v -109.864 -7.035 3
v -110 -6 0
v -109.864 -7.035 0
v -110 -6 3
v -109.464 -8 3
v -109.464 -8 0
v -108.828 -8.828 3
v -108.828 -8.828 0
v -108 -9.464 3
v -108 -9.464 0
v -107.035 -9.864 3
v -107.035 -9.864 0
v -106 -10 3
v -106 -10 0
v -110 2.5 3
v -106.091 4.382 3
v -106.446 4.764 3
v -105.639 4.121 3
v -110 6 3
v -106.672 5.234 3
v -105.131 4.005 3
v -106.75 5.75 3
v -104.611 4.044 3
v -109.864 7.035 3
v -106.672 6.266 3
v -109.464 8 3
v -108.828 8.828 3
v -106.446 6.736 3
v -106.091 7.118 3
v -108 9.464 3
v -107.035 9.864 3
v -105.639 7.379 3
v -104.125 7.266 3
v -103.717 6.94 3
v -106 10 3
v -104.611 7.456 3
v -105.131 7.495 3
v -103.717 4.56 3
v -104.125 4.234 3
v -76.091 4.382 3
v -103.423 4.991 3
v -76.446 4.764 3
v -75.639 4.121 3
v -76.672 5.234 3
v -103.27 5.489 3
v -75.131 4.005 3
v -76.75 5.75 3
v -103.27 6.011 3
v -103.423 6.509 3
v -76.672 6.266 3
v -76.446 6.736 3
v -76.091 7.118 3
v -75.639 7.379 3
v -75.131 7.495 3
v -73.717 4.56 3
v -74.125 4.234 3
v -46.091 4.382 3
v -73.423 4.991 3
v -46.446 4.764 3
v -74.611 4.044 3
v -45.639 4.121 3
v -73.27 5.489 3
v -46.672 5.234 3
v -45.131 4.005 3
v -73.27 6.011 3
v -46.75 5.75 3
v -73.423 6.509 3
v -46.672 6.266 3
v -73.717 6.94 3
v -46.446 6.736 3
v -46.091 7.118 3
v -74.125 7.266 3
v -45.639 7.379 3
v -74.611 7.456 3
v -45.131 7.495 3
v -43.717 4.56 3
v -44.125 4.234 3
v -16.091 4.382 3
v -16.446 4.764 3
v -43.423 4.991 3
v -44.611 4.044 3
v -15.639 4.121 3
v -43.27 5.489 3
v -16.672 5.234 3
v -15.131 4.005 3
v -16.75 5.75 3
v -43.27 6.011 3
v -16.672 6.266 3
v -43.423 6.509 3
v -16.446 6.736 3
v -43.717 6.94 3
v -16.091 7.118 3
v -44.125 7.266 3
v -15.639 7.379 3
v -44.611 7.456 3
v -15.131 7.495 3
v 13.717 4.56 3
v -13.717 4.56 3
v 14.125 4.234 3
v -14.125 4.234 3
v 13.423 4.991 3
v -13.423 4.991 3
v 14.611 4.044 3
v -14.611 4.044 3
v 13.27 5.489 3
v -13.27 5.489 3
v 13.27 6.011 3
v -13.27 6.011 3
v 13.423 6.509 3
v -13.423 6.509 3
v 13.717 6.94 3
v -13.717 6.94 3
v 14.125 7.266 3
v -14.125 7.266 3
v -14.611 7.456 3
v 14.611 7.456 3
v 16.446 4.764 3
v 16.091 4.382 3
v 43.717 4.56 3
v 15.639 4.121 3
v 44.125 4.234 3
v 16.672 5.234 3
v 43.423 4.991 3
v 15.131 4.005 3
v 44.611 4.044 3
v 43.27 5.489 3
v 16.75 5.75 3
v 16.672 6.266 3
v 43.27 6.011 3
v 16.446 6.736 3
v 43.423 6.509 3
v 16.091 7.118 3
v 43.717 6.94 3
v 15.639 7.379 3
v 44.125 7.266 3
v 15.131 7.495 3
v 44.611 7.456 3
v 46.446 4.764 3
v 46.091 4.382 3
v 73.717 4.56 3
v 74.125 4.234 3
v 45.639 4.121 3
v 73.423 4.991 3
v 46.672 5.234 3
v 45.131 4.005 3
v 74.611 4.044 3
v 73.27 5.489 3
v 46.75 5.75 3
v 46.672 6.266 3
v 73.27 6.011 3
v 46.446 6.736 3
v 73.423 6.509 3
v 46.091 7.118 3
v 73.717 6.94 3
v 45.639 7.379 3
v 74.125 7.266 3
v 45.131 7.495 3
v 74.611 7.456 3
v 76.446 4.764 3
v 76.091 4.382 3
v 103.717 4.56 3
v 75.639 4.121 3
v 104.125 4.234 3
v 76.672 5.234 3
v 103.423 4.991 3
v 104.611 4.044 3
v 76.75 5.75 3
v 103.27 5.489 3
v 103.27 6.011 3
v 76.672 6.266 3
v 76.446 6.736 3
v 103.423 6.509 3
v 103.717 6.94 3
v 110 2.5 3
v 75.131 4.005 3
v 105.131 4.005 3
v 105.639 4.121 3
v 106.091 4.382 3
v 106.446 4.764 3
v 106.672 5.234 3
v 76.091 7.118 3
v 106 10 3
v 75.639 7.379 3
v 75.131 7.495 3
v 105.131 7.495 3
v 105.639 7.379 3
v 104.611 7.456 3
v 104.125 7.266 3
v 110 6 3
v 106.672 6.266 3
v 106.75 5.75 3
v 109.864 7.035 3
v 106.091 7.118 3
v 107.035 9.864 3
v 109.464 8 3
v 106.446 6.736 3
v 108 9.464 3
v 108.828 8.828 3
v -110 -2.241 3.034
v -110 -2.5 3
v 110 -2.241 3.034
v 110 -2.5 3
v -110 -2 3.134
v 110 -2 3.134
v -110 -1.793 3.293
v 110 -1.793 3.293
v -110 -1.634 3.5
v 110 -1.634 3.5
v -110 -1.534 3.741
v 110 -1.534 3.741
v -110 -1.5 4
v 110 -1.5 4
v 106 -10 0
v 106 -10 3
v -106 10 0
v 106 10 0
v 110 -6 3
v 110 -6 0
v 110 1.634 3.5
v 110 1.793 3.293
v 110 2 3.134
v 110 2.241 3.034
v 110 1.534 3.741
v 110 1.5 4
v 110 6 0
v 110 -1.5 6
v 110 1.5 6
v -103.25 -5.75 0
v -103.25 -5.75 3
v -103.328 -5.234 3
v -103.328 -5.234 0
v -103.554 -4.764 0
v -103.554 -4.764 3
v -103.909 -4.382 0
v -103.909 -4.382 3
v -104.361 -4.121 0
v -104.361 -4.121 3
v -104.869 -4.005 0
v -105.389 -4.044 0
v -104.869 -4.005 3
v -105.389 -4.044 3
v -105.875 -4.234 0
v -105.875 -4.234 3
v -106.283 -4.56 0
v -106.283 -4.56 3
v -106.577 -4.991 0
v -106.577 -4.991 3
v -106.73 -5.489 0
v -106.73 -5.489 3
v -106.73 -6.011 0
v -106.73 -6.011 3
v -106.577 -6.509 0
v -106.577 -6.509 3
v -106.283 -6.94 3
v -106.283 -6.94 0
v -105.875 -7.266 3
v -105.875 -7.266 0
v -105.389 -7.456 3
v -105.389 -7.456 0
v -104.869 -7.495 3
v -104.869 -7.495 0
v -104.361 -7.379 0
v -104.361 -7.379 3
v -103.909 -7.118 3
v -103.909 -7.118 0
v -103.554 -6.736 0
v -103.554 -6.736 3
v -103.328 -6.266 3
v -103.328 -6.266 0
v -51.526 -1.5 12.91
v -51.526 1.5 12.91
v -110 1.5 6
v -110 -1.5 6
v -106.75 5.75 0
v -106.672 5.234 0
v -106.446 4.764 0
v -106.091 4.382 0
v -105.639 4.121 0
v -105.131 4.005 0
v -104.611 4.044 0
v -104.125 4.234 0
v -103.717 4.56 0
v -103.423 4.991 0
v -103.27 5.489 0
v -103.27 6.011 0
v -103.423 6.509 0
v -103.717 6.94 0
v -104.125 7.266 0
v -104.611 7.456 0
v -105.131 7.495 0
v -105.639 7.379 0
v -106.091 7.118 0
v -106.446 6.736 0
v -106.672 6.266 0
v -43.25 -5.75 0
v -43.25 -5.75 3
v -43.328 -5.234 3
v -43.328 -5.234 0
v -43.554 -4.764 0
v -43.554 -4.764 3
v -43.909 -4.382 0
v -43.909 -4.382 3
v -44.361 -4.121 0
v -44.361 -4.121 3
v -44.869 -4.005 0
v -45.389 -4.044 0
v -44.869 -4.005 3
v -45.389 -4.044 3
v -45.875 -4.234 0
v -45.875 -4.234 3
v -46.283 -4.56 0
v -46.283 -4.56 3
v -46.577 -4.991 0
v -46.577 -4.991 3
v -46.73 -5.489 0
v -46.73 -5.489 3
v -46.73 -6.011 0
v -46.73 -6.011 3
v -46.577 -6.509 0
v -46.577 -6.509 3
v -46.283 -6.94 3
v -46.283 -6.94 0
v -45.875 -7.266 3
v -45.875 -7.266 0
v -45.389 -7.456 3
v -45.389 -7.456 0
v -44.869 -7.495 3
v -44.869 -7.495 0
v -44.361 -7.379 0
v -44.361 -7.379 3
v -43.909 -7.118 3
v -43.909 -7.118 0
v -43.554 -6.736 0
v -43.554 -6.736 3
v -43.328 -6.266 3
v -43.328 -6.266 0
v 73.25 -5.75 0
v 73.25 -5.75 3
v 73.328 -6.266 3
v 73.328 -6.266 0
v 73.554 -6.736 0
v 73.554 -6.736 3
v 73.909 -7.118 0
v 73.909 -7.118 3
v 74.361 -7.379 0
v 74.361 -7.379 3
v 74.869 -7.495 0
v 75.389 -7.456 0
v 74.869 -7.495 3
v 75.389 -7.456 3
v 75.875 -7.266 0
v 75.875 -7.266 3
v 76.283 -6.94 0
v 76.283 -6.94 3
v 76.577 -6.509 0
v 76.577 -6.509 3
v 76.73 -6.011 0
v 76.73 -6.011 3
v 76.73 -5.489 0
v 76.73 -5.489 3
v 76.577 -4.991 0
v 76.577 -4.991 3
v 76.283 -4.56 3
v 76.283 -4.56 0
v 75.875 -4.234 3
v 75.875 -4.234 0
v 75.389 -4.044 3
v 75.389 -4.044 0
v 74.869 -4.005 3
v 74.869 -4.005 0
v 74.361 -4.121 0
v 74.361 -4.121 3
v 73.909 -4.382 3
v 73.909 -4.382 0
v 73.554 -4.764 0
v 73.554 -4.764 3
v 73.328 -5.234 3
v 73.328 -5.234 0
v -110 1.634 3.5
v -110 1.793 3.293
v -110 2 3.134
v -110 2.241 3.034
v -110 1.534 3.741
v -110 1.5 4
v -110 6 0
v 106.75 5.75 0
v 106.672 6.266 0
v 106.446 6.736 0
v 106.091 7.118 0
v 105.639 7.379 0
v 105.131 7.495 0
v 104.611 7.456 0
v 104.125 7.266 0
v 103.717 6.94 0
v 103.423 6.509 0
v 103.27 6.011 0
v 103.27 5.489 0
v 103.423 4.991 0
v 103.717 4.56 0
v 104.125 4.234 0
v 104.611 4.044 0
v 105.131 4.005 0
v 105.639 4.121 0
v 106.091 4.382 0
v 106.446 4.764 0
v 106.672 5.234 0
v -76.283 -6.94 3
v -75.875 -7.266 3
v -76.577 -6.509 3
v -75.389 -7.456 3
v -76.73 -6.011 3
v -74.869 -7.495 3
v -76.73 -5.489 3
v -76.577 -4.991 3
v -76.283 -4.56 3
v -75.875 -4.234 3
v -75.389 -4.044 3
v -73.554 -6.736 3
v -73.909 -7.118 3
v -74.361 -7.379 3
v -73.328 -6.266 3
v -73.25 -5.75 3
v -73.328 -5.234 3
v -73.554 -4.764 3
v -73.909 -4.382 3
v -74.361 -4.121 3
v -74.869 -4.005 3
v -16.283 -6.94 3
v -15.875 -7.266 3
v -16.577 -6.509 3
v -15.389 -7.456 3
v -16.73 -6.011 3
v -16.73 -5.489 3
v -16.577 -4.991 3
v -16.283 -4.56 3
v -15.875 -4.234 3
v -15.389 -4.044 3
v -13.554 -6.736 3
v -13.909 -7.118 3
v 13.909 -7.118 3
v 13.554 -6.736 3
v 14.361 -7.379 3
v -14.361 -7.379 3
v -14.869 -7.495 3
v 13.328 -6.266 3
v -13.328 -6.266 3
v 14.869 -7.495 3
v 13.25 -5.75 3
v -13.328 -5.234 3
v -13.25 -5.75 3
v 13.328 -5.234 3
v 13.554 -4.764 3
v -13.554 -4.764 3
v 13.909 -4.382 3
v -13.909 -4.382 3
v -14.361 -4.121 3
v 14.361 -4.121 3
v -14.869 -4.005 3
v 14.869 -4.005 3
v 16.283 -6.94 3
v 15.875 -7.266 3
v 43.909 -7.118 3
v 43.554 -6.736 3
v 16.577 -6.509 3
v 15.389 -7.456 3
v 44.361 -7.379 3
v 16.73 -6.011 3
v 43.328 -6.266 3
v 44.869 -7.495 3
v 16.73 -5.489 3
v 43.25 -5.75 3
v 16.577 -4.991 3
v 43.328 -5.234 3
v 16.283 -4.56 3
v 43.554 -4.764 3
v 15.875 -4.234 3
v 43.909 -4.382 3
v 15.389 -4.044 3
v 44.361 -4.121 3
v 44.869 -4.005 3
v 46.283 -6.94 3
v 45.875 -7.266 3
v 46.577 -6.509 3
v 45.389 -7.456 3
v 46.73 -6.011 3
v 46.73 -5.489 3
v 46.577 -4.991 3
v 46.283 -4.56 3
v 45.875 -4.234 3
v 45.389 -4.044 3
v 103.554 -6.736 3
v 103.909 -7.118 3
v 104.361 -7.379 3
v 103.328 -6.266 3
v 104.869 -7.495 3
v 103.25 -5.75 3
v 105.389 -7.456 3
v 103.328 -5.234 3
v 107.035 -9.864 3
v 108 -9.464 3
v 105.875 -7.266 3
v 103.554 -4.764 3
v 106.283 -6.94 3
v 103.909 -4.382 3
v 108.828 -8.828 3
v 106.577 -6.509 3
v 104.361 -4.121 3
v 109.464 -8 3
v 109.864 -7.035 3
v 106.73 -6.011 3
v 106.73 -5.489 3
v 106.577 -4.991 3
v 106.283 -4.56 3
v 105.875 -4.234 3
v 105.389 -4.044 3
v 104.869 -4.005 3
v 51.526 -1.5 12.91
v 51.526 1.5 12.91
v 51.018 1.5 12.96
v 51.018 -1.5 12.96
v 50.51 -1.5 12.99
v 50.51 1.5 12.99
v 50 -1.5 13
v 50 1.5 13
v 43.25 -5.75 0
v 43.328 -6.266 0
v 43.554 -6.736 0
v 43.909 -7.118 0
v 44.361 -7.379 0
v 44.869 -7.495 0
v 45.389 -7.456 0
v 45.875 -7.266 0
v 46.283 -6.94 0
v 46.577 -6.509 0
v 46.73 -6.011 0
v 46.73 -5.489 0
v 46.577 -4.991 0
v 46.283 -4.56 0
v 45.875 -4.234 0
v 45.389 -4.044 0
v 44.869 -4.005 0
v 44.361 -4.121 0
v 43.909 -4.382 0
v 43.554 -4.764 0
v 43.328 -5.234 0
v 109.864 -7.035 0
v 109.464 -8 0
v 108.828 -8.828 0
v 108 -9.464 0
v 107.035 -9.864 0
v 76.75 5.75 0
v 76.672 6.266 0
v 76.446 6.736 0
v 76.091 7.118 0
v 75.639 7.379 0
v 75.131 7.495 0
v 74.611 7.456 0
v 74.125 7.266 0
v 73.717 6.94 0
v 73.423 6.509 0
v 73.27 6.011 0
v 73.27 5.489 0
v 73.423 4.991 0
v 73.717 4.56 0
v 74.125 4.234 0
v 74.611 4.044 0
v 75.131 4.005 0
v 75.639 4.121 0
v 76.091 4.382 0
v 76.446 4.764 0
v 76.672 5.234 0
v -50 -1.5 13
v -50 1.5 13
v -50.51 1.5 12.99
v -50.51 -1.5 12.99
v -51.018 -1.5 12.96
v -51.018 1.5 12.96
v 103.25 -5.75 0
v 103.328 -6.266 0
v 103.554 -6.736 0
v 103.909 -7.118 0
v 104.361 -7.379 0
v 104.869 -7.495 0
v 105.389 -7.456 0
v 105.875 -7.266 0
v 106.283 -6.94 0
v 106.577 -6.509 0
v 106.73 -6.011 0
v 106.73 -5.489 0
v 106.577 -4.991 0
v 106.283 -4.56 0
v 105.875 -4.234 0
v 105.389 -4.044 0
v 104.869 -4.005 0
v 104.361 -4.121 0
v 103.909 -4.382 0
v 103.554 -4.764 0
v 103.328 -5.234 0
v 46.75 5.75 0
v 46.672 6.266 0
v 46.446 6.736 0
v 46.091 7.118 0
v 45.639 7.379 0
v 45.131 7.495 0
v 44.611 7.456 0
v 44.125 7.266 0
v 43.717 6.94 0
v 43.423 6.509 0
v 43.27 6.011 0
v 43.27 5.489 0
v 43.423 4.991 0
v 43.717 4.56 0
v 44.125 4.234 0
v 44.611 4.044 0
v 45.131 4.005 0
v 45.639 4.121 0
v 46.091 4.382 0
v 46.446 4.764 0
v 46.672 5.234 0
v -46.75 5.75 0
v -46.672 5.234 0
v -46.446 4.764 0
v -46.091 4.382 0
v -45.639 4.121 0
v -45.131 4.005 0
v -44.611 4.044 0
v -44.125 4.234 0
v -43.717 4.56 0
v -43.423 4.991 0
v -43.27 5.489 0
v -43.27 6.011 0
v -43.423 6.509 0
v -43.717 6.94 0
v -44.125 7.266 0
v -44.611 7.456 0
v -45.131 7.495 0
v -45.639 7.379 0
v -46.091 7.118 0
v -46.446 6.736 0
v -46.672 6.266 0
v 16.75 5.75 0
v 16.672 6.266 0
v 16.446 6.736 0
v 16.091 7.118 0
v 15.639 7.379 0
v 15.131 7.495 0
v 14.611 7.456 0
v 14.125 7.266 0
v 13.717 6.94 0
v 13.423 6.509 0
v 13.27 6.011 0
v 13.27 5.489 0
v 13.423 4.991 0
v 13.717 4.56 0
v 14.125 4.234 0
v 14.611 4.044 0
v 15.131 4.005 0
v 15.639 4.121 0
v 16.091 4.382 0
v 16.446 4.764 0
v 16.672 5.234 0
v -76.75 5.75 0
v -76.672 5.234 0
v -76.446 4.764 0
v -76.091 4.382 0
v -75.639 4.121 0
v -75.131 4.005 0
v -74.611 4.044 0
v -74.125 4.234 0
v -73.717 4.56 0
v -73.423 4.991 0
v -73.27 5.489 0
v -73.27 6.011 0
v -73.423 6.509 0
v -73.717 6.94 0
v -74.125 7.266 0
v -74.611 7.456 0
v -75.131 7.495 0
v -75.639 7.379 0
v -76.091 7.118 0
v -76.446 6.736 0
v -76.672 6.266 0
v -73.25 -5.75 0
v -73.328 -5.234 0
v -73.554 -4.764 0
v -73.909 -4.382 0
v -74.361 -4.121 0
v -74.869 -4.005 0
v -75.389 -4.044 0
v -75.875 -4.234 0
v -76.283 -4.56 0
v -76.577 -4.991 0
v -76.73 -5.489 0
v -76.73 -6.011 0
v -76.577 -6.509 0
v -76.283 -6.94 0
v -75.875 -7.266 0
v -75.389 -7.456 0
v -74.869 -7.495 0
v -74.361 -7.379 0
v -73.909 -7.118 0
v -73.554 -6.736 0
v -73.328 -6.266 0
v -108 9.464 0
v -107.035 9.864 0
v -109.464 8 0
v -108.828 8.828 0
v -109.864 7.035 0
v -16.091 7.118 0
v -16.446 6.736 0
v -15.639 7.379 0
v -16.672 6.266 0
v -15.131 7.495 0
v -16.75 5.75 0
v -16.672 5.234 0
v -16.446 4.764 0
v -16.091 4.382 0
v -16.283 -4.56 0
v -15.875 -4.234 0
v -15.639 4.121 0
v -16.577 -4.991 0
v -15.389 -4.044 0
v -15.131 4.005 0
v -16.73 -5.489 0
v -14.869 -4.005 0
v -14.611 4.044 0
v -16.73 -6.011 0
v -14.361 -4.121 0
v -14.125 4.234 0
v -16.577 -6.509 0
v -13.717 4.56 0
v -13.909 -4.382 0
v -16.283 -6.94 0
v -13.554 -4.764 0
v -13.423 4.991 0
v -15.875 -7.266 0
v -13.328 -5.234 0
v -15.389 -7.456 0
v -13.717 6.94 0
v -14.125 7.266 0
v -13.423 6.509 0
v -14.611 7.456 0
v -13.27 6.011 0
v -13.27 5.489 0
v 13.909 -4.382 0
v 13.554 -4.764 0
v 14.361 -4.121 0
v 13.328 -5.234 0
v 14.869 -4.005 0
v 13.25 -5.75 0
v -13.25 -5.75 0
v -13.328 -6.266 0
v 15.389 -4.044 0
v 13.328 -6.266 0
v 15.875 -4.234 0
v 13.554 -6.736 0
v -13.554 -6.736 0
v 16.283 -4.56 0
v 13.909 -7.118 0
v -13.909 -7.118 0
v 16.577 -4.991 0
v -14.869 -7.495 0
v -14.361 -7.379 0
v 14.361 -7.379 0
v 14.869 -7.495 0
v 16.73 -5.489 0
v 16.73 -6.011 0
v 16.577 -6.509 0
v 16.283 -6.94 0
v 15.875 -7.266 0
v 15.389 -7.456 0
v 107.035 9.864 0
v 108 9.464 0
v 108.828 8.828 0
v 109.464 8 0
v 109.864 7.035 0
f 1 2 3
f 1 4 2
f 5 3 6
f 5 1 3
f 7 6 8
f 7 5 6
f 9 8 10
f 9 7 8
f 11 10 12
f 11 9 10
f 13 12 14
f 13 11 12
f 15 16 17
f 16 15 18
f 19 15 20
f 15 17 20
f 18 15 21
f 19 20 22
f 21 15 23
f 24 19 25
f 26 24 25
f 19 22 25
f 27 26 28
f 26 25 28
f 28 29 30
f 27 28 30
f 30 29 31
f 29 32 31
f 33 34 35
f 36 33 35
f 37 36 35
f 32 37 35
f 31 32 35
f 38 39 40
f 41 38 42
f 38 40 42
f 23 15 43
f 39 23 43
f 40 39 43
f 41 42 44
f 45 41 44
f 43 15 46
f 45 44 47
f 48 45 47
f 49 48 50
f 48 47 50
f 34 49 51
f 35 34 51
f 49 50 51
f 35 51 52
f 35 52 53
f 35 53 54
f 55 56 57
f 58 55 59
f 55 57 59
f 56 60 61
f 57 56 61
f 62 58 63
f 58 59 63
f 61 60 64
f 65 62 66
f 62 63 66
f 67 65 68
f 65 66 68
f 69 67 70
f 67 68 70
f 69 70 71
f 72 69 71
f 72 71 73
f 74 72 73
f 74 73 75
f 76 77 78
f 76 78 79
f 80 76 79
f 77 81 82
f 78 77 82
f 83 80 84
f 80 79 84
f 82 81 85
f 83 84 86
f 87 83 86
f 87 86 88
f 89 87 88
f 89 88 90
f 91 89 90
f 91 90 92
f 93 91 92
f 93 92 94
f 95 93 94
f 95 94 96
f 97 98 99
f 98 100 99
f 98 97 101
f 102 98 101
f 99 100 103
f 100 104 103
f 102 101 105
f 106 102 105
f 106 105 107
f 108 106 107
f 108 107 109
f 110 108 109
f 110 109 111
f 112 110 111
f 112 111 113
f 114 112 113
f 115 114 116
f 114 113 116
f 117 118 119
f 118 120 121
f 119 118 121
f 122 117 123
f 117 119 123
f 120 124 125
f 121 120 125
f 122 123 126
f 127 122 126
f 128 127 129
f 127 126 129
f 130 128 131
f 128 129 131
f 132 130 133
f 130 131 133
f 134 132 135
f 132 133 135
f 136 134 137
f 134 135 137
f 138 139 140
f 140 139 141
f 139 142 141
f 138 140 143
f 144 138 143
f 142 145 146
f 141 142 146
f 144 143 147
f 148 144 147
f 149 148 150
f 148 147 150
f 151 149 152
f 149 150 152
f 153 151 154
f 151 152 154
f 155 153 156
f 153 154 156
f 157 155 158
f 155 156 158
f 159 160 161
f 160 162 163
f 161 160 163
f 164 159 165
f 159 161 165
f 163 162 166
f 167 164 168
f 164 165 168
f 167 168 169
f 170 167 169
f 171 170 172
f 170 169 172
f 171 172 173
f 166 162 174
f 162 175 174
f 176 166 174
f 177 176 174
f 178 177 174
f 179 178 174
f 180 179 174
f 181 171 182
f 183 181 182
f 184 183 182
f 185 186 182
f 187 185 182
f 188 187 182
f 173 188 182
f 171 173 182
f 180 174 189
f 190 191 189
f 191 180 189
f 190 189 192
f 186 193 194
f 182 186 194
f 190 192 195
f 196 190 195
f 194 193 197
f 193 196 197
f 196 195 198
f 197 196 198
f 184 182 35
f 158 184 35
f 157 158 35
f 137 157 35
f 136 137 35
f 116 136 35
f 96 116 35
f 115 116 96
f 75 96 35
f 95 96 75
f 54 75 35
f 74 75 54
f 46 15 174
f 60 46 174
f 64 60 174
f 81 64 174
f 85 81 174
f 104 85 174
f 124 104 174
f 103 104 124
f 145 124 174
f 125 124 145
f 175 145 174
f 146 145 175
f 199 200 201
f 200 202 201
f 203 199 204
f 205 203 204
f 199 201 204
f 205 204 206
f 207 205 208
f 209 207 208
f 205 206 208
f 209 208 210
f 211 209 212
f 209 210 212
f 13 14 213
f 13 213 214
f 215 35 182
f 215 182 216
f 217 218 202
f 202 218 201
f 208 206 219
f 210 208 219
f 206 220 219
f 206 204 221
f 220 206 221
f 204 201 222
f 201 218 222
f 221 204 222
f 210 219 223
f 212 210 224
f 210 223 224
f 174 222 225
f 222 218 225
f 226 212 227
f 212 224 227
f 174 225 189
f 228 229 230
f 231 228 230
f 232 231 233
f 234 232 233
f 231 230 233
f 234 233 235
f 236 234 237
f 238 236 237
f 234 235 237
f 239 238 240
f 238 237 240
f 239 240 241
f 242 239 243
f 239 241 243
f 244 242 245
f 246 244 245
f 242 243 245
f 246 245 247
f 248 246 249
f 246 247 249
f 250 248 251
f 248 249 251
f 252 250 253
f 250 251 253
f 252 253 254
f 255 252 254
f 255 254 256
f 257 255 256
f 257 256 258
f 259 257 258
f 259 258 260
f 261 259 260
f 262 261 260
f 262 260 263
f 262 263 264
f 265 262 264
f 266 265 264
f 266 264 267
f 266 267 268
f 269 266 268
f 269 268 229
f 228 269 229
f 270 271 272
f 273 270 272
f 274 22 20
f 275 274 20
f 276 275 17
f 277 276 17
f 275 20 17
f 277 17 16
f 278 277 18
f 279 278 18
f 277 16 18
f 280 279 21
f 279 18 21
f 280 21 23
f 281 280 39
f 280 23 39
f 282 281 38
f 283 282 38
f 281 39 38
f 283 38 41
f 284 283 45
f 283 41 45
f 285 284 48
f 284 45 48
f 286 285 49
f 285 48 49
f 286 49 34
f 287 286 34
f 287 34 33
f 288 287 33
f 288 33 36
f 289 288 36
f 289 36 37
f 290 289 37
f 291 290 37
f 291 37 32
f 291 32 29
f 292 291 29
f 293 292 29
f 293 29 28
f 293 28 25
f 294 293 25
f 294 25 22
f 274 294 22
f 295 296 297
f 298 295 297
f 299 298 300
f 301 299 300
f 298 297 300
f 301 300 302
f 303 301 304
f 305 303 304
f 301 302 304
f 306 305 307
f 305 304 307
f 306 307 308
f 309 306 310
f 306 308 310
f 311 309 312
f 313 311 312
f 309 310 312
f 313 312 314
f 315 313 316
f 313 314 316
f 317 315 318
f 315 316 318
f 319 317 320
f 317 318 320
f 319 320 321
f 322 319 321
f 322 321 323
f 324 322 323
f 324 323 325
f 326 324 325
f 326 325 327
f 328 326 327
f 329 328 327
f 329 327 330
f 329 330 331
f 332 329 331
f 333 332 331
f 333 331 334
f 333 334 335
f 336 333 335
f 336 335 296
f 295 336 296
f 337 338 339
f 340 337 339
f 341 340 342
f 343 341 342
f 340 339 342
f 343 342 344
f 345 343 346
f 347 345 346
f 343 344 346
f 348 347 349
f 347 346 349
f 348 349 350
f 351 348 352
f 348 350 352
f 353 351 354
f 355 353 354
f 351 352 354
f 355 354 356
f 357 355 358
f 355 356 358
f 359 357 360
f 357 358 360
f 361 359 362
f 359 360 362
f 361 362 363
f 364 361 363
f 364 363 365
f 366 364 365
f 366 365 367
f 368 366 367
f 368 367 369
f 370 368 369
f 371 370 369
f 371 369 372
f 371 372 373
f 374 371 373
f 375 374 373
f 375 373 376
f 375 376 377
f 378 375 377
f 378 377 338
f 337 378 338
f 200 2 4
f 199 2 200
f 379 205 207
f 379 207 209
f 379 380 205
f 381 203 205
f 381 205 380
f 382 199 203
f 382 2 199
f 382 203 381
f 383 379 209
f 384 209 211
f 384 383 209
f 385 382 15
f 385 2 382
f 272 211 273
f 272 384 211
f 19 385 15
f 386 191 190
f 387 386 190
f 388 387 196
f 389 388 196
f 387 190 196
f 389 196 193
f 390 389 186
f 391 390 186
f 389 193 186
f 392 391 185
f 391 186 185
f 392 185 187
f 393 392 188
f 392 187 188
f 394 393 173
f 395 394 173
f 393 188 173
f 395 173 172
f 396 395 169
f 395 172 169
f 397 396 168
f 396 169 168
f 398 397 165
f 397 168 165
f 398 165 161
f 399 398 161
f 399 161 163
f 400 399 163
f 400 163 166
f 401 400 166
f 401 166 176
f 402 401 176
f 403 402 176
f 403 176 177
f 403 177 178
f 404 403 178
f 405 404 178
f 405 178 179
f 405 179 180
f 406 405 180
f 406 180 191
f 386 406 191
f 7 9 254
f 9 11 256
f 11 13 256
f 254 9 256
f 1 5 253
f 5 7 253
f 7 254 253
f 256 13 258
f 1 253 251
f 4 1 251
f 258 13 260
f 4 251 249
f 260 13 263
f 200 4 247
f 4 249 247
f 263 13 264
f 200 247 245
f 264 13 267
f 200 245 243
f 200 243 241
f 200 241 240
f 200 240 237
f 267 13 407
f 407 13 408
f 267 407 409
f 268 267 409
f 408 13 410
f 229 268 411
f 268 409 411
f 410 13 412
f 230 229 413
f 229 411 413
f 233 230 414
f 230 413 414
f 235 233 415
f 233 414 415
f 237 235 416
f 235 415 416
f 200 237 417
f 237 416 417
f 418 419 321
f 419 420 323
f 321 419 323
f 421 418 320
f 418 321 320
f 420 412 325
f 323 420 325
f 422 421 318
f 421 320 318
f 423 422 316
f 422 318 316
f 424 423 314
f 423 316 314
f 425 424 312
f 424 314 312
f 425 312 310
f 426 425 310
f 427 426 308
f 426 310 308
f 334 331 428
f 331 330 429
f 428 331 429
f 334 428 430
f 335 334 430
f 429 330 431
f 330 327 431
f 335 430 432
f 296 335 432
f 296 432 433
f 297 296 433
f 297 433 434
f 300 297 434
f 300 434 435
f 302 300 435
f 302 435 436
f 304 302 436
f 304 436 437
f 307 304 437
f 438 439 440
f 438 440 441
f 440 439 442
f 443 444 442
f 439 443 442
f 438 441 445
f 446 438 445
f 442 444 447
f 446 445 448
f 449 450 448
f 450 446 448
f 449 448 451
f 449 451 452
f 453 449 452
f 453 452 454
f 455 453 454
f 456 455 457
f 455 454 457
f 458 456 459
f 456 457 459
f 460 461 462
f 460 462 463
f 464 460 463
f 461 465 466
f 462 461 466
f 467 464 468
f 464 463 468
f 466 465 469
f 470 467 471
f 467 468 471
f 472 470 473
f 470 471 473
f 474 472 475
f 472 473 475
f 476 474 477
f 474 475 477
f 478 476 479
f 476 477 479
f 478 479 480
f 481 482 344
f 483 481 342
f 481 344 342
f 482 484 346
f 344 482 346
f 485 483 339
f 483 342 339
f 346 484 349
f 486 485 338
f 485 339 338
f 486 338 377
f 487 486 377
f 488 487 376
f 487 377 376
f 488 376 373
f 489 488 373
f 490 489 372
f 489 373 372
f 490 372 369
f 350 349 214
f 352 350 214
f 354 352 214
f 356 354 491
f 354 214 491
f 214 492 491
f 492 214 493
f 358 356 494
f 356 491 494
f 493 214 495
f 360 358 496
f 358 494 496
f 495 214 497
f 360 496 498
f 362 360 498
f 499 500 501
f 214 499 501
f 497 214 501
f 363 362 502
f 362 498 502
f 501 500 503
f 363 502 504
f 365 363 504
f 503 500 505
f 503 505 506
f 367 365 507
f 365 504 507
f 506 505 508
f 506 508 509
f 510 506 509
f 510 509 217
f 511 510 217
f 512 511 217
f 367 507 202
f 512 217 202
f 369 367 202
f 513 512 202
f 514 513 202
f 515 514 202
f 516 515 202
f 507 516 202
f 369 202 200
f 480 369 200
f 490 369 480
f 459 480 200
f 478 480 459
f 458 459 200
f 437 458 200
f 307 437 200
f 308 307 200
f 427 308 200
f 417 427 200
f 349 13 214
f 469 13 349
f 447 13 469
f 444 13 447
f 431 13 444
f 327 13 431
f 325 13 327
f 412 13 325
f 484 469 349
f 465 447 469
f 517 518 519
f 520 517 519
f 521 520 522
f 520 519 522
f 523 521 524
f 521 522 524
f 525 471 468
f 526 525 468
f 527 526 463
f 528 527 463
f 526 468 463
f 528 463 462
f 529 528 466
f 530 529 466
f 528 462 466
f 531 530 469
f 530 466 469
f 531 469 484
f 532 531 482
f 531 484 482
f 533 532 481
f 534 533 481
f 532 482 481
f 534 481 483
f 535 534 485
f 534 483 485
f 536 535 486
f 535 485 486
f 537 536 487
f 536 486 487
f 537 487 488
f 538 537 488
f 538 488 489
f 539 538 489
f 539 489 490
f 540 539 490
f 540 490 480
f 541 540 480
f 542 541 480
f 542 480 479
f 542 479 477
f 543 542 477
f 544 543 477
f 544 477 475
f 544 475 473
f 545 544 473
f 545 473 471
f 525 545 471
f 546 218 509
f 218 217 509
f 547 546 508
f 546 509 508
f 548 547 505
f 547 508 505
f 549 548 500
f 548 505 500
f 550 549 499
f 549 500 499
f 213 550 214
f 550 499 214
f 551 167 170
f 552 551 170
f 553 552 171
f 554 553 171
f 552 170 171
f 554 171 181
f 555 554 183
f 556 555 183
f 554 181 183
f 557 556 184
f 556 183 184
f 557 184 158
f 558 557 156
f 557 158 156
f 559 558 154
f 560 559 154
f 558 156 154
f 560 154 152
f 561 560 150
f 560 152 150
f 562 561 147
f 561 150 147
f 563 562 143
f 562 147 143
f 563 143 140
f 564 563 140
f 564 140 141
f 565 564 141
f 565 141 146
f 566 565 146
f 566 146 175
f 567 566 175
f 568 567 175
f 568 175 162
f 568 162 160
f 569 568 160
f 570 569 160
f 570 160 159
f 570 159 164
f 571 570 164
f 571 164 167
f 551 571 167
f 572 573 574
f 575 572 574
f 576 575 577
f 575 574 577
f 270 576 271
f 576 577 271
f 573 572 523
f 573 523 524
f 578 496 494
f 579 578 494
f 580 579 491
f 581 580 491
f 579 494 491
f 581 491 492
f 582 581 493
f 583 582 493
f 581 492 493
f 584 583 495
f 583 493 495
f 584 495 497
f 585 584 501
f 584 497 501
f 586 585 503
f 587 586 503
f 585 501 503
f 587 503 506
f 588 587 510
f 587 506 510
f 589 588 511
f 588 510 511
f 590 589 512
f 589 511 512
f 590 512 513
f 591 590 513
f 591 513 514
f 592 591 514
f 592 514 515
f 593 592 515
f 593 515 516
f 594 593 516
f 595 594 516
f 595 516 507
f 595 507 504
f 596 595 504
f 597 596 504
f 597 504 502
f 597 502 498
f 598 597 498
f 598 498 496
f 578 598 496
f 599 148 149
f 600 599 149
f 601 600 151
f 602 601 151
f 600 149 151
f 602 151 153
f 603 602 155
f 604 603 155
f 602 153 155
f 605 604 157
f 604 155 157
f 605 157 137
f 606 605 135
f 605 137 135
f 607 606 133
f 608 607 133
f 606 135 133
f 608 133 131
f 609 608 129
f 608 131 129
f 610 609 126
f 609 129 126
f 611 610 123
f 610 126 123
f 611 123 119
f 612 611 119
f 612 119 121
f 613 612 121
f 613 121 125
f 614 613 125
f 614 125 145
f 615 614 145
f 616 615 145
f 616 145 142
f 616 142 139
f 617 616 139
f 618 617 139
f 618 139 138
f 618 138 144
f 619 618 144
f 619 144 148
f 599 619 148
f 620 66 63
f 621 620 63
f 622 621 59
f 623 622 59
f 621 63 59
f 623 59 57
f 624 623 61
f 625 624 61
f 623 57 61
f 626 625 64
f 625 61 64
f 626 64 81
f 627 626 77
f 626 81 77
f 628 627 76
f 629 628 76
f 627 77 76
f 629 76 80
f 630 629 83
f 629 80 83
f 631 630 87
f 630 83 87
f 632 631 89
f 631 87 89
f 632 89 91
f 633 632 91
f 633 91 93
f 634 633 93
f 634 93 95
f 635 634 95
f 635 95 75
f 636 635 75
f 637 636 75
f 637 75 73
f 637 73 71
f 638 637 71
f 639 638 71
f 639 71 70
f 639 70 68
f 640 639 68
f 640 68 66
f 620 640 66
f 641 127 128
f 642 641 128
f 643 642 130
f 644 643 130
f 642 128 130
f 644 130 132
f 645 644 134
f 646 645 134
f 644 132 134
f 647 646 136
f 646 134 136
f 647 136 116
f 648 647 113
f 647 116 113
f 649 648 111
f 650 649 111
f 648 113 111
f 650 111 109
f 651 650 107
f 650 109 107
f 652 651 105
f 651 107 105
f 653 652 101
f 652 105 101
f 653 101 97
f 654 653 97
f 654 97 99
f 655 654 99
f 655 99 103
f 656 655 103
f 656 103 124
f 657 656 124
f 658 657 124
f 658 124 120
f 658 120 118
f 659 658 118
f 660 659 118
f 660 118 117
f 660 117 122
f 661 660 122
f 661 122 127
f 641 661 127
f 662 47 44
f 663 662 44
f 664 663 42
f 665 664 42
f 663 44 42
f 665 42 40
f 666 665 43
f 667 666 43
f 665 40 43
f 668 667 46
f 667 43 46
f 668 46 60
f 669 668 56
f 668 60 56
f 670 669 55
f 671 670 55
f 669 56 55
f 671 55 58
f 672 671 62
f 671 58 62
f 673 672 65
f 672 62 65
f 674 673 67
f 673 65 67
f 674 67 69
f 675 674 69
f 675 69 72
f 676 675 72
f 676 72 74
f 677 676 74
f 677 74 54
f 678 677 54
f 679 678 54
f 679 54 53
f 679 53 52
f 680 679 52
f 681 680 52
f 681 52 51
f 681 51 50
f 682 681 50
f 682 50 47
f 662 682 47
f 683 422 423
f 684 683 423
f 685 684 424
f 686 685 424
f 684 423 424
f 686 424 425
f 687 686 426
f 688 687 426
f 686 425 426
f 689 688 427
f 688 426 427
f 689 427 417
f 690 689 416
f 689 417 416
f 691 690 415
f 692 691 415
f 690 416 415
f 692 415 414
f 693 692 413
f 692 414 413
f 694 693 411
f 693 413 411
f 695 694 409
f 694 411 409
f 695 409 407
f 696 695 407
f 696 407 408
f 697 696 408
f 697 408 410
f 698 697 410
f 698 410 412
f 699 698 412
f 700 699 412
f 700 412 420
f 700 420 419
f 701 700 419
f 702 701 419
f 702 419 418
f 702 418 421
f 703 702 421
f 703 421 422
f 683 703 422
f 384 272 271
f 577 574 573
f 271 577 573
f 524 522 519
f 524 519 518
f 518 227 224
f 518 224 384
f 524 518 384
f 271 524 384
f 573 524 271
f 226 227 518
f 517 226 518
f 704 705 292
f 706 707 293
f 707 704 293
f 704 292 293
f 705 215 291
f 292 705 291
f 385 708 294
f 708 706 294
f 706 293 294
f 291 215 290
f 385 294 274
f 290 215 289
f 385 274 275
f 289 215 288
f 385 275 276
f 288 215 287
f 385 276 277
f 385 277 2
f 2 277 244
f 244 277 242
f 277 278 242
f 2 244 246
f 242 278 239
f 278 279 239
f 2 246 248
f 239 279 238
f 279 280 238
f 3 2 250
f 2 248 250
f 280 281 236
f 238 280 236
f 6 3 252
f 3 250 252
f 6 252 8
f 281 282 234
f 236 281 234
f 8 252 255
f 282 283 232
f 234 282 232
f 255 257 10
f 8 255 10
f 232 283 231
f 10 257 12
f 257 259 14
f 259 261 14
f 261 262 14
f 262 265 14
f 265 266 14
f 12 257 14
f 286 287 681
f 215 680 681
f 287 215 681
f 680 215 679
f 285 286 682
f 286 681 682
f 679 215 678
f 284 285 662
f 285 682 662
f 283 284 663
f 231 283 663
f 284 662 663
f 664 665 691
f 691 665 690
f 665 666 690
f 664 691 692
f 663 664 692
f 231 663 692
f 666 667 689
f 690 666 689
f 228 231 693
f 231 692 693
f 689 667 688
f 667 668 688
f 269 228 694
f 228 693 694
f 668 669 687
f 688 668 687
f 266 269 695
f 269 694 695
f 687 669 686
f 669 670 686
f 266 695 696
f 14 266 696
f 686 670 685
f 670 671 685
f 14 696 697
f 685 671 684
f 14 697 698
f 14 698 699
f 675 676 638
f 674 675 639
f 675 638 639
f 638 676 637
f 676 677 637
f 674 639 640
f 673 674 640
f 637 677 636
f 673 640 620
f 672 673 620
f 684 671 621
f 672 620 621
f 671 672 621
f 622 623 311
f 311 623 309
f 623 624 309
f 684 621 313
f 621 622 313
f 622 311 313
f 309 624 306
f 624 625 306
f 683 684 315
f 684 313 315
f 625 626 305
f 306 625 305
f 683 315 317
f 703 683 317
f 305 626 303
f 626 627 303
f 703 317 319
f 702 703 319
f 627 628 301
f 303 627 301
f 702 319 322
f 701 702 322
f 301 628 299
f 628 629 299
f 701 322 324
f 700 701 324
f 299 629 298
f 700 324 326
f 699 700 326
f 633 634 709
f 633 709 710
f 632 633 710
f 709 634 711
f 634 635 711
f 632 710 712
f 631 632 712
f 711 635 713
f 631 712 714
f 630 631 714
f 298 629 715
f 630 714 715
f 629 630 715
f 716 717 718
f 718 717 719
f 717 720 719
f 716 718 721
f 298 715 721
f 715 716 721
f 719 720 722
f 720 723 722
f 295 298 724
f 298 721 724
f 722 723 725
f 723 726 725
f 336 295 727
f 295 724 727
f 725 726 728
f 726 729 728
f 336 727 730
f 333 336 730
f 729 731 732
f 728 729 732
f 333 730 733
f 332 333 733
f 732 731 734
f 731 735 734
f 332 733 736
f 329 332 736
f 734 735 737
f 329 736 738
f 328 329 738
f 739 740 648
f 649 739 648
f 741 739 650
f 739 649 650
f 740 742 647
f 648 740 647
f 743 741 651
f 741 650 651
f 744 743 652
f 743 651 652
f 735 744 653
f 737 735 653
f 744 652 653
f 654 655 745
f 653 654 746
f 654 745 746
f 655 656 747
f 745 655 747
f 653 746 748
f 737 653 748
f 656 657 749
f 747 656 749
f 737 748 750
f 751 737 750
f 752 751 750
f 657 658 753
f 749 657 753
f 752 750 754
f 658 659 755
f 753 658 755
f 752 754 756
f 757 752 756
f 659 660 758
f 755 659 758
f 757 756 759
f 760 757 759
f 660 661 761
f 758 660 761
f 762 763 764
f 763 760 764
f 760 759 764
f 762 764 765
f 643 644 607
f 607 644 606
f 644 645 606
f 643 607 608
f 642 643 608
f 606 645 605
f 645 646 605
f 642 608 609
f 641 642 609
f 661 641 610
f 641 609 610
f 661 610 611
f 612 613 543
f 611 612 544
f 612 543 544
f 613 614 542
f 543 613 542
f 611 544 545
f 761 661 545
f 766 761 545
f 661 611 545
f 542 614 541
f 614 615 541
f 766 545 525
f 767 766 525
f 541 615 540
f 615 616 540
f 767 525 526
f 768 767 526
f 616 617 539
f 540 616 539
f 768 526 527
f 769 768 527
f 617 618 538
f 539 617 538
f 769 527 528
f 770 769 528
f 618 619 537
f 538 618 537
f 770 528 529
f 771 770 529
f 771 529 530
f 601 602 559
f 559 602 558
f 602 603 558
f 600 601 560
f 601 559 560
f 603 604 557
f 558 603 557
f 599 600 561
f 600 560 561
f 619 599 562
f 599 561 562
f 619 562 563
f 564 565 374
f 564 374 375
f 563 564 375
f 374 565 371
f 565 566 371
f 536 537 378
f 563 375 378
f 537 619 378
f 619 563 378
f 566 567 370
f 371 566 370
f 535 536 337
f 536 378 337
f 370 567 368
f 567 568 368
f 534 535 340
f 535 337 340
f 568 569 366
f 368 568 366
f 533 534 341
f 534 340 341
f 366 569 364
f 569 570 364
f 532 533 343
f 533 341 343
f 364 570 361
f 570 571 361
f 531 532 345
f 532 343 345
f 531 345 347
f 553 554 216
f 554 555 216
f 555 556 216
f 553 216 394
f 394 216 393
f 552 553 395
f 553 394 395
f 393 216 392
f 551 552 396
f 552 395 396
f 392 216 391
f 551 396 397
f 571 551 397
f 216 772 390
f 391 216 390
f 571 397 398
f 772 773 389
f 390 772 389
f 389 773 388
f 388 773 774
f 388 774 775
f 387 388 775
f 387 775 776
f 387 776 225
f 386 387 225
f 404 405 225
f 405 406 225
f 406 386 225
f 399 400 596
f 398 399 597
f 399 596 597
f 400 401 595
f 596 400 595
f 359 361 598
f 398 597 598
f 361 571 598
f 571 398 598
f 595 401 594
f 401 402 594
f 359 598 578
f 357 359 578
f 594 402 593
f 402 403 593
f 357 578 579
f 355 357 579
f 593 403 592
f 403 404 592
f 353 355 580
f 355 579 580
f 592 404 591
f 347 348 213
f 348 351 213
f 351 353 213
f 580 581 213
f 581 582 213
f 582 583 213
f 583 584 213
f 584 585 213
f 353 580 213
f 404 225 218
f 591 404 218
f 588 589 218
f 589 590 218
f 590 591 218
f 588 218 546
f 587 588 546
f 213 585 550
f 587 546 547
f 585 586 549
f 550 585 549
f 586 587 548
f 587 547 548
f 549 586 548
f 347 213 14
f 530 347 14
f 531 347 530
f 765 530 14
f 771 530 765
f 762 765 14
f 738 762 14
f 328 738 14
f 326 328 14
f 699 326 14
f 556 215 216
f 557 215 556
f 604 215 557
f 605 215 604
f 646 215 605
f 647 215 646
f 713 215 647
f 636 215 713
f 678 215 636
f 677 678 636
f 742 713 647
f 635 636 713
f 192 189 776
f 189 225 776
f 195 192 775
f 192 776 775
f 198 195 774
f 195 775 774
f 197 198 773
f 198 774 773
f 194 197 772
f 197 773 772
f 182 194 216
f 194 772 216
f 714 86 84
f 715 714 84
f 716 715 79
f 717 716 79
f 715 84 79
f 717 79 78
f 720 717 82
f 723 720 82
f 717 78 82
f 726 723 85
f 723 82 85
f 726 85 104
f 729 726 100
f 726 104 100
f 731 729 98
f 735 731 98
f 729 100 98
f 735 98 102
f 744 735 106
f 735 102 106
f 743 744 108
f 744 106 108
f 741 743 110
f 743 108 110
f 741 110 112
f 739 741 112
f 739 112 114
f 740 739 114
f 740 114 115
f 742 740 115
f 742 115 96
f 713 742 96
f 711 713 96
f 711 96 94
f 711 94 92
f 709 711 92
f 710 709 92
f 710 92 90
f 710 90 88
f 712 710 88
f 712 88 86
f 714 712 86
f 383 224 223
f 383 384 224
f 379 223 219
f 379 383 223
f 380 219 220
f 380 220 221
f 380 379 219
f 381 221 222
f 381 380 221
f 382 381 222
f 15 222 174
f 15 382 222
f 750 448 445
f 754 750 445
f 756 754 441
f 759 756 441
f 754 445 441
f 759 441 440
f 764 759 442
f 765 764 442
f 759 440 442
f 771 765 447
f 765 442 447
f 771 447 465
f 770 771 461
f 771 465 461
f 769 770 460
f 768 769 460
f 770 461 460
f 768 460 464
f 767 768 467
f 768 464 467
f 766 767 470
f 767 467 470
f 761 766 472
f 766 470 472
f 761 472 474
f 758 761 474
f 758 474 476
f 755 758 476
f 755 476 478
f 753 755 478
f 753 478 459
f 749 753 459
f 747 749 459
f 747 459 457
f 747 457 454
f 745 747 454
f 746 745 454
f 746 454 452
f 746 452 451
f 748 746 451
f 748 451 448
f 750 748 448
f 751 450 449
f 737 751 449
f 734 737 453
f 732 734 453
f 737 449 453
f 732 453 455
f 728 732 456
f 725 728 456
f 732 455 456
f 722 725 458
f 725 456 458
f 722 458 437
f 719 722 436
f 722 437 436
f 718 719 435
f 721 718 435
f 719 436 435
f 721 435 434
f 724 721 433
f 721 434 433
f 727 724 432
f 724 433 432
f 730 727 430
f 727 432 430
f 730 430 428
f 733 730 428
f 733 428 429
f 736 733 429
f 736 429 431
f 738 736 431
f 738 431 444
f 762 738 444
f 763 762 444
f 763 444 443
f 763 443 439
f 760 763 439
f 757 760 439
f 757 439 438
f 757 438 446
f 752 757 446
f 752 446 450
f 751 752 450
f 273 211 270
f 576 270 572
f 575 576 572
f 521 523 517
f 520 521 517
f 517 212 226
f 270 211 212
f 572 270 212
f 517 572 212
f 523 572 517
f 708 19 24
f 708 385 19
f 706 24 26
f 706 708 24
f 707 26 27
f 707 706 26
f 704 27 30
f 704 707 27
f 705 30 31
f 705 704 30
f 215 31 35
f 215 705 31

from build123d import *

# Parameters (mm, degrees)
BOSS_EXTRUDE1_DEPTH = 110
SKETCH2_R           = 1.75
CUT_EXTRUDE1_DEPTH  = 111.905365064
CUT_EXTRUDE2_DEPTH  = 112.360899781
FILLET1_R           = 4
FILLET2_R           = 1


with BuildPart() as part:
    # Sketch1 → Boss-Extrude1 (new, symmetric)
    with BuildSketch(Plane(origin=(0, 0, 0), x_dir=(0, 0, -1), z_dir=(1, 0, 0))):
        Polygon((-13, -1.5), (-13, 1.5), (-3, 1.5), (-3, 10), (0, 10), (0, -10), (-3, -10), (-3, -1.5), align=None)
    extrude(amount=BOSS_EXTRUDE1_DEPTH, both=True)

    # Sketch2 → Cut-Extrude1 (cut, through all)
    with BuildSketch(Plane.XY.offset(3)):
        with Locations((-15, -5.75)):
            Circle(SKETCH2_R)
        with Locations((-45, -5.75)):
            Circle(SKETCH2_R)
        with Locations((-75, -5.75)):
            Circle(SKETCH2_R)
        with Locations((-105, -5.75)):
            Circle(SKETCH2_R)
        with Locations(Location((105, -5.75, 0), (0, 0, 180))):
            Circle(SKETCH2_R)
        with Locations(Location((75, -5.75, 0), (0, 0, 180))):
            Circle(SKETCH2_R)
        with Locations(Location((45, -5.75, 0), (0, 0, 180))):
            Circle(SKETCH2_R)
        with Locations(Location((15, -5.75, 0), (0, 0, 180))):
            Circle(SKETCH2_R)
        with Locations((15, 5.75)):
            Circle(SKETCH2_R)
        with Locations((45, 5.75)):
            Circle(SKETCH2_R)
        with Locations((75, 5.75)):
            Circle(SKETCH2_R)
        with Locations((105, 5.75)):
            Circle(SKETCH2_R)
        with Locations(Location((-105, 5.75, 0), (0, 0, 180))):
            Circle(SKETCH2_R)
        with Locations(Location((-75, 5.75, 0), (0, 0, 180))):
            Circle(SKETCH2_R)
        with Locations(Location((-45, 5.75, 0), (0, 0, 180))):
            Circle(SKETCH2_R)
        with Locations(Location((-15, 5.75, 0), (0, 0, 180))):
            Circle(SKETCH2_R)
    extrude(amount=-CUT_EXTRUDE1_DEPTH, mode=Mode.SUBTRACT)

    # Sketch3 → Cut-Extrude2 (cut, through all)
    with BuildSketch(Plane(origin=(0, 1.5, 0), x_dir=(1, 0, 0), z_dir=(0, 1, 0))):
        with BuildLine():
            Line((50, -13), (110, -13))
            Line((110, -13), (110, -6))
            Line((110, -6), (51.525650044, -12.910166224))
            ThreePointArc((51.525650044, -12.910166224), (50.764146283, -12.977522123), (50, -13))
        make_face()
        with BuildLine():
            Line((-51.525650044, -12.910166224), (-110, -6))
            Line((-110, -6), (-110, -13))
            Line((-110, -13), (-50, -13))
            ThreePointArc((-50, -13), (-50.764146283, -12.977522123), (-51.525650044, -12.910166224))
        make_face()
    extrude(amount=-CUT_EXTRUDE2_DEPTH, mode=Mode.SUBTRACT)

    # Fillet1
    fillet1_edges = [part.edges().sort_by_distance(p)[0] for p in [
        (110, -10, 1.5),
        (110, 10, 1.5),
        (-110, 10, 1.5),
        (-110, -10, 1.5),
    ]]
    fillet(fillet1_edges, radius=FILLET1_R)

    # Fillet2
    fillet2_edges = [part.edges().sort_by_distance(p)[0] for p in [
        (0, -1.5, 3),
        (0, 1.5, 3),
    ]]
    fillet(fillet2_edges, radius=FILLET2_R)


solid = part.part
